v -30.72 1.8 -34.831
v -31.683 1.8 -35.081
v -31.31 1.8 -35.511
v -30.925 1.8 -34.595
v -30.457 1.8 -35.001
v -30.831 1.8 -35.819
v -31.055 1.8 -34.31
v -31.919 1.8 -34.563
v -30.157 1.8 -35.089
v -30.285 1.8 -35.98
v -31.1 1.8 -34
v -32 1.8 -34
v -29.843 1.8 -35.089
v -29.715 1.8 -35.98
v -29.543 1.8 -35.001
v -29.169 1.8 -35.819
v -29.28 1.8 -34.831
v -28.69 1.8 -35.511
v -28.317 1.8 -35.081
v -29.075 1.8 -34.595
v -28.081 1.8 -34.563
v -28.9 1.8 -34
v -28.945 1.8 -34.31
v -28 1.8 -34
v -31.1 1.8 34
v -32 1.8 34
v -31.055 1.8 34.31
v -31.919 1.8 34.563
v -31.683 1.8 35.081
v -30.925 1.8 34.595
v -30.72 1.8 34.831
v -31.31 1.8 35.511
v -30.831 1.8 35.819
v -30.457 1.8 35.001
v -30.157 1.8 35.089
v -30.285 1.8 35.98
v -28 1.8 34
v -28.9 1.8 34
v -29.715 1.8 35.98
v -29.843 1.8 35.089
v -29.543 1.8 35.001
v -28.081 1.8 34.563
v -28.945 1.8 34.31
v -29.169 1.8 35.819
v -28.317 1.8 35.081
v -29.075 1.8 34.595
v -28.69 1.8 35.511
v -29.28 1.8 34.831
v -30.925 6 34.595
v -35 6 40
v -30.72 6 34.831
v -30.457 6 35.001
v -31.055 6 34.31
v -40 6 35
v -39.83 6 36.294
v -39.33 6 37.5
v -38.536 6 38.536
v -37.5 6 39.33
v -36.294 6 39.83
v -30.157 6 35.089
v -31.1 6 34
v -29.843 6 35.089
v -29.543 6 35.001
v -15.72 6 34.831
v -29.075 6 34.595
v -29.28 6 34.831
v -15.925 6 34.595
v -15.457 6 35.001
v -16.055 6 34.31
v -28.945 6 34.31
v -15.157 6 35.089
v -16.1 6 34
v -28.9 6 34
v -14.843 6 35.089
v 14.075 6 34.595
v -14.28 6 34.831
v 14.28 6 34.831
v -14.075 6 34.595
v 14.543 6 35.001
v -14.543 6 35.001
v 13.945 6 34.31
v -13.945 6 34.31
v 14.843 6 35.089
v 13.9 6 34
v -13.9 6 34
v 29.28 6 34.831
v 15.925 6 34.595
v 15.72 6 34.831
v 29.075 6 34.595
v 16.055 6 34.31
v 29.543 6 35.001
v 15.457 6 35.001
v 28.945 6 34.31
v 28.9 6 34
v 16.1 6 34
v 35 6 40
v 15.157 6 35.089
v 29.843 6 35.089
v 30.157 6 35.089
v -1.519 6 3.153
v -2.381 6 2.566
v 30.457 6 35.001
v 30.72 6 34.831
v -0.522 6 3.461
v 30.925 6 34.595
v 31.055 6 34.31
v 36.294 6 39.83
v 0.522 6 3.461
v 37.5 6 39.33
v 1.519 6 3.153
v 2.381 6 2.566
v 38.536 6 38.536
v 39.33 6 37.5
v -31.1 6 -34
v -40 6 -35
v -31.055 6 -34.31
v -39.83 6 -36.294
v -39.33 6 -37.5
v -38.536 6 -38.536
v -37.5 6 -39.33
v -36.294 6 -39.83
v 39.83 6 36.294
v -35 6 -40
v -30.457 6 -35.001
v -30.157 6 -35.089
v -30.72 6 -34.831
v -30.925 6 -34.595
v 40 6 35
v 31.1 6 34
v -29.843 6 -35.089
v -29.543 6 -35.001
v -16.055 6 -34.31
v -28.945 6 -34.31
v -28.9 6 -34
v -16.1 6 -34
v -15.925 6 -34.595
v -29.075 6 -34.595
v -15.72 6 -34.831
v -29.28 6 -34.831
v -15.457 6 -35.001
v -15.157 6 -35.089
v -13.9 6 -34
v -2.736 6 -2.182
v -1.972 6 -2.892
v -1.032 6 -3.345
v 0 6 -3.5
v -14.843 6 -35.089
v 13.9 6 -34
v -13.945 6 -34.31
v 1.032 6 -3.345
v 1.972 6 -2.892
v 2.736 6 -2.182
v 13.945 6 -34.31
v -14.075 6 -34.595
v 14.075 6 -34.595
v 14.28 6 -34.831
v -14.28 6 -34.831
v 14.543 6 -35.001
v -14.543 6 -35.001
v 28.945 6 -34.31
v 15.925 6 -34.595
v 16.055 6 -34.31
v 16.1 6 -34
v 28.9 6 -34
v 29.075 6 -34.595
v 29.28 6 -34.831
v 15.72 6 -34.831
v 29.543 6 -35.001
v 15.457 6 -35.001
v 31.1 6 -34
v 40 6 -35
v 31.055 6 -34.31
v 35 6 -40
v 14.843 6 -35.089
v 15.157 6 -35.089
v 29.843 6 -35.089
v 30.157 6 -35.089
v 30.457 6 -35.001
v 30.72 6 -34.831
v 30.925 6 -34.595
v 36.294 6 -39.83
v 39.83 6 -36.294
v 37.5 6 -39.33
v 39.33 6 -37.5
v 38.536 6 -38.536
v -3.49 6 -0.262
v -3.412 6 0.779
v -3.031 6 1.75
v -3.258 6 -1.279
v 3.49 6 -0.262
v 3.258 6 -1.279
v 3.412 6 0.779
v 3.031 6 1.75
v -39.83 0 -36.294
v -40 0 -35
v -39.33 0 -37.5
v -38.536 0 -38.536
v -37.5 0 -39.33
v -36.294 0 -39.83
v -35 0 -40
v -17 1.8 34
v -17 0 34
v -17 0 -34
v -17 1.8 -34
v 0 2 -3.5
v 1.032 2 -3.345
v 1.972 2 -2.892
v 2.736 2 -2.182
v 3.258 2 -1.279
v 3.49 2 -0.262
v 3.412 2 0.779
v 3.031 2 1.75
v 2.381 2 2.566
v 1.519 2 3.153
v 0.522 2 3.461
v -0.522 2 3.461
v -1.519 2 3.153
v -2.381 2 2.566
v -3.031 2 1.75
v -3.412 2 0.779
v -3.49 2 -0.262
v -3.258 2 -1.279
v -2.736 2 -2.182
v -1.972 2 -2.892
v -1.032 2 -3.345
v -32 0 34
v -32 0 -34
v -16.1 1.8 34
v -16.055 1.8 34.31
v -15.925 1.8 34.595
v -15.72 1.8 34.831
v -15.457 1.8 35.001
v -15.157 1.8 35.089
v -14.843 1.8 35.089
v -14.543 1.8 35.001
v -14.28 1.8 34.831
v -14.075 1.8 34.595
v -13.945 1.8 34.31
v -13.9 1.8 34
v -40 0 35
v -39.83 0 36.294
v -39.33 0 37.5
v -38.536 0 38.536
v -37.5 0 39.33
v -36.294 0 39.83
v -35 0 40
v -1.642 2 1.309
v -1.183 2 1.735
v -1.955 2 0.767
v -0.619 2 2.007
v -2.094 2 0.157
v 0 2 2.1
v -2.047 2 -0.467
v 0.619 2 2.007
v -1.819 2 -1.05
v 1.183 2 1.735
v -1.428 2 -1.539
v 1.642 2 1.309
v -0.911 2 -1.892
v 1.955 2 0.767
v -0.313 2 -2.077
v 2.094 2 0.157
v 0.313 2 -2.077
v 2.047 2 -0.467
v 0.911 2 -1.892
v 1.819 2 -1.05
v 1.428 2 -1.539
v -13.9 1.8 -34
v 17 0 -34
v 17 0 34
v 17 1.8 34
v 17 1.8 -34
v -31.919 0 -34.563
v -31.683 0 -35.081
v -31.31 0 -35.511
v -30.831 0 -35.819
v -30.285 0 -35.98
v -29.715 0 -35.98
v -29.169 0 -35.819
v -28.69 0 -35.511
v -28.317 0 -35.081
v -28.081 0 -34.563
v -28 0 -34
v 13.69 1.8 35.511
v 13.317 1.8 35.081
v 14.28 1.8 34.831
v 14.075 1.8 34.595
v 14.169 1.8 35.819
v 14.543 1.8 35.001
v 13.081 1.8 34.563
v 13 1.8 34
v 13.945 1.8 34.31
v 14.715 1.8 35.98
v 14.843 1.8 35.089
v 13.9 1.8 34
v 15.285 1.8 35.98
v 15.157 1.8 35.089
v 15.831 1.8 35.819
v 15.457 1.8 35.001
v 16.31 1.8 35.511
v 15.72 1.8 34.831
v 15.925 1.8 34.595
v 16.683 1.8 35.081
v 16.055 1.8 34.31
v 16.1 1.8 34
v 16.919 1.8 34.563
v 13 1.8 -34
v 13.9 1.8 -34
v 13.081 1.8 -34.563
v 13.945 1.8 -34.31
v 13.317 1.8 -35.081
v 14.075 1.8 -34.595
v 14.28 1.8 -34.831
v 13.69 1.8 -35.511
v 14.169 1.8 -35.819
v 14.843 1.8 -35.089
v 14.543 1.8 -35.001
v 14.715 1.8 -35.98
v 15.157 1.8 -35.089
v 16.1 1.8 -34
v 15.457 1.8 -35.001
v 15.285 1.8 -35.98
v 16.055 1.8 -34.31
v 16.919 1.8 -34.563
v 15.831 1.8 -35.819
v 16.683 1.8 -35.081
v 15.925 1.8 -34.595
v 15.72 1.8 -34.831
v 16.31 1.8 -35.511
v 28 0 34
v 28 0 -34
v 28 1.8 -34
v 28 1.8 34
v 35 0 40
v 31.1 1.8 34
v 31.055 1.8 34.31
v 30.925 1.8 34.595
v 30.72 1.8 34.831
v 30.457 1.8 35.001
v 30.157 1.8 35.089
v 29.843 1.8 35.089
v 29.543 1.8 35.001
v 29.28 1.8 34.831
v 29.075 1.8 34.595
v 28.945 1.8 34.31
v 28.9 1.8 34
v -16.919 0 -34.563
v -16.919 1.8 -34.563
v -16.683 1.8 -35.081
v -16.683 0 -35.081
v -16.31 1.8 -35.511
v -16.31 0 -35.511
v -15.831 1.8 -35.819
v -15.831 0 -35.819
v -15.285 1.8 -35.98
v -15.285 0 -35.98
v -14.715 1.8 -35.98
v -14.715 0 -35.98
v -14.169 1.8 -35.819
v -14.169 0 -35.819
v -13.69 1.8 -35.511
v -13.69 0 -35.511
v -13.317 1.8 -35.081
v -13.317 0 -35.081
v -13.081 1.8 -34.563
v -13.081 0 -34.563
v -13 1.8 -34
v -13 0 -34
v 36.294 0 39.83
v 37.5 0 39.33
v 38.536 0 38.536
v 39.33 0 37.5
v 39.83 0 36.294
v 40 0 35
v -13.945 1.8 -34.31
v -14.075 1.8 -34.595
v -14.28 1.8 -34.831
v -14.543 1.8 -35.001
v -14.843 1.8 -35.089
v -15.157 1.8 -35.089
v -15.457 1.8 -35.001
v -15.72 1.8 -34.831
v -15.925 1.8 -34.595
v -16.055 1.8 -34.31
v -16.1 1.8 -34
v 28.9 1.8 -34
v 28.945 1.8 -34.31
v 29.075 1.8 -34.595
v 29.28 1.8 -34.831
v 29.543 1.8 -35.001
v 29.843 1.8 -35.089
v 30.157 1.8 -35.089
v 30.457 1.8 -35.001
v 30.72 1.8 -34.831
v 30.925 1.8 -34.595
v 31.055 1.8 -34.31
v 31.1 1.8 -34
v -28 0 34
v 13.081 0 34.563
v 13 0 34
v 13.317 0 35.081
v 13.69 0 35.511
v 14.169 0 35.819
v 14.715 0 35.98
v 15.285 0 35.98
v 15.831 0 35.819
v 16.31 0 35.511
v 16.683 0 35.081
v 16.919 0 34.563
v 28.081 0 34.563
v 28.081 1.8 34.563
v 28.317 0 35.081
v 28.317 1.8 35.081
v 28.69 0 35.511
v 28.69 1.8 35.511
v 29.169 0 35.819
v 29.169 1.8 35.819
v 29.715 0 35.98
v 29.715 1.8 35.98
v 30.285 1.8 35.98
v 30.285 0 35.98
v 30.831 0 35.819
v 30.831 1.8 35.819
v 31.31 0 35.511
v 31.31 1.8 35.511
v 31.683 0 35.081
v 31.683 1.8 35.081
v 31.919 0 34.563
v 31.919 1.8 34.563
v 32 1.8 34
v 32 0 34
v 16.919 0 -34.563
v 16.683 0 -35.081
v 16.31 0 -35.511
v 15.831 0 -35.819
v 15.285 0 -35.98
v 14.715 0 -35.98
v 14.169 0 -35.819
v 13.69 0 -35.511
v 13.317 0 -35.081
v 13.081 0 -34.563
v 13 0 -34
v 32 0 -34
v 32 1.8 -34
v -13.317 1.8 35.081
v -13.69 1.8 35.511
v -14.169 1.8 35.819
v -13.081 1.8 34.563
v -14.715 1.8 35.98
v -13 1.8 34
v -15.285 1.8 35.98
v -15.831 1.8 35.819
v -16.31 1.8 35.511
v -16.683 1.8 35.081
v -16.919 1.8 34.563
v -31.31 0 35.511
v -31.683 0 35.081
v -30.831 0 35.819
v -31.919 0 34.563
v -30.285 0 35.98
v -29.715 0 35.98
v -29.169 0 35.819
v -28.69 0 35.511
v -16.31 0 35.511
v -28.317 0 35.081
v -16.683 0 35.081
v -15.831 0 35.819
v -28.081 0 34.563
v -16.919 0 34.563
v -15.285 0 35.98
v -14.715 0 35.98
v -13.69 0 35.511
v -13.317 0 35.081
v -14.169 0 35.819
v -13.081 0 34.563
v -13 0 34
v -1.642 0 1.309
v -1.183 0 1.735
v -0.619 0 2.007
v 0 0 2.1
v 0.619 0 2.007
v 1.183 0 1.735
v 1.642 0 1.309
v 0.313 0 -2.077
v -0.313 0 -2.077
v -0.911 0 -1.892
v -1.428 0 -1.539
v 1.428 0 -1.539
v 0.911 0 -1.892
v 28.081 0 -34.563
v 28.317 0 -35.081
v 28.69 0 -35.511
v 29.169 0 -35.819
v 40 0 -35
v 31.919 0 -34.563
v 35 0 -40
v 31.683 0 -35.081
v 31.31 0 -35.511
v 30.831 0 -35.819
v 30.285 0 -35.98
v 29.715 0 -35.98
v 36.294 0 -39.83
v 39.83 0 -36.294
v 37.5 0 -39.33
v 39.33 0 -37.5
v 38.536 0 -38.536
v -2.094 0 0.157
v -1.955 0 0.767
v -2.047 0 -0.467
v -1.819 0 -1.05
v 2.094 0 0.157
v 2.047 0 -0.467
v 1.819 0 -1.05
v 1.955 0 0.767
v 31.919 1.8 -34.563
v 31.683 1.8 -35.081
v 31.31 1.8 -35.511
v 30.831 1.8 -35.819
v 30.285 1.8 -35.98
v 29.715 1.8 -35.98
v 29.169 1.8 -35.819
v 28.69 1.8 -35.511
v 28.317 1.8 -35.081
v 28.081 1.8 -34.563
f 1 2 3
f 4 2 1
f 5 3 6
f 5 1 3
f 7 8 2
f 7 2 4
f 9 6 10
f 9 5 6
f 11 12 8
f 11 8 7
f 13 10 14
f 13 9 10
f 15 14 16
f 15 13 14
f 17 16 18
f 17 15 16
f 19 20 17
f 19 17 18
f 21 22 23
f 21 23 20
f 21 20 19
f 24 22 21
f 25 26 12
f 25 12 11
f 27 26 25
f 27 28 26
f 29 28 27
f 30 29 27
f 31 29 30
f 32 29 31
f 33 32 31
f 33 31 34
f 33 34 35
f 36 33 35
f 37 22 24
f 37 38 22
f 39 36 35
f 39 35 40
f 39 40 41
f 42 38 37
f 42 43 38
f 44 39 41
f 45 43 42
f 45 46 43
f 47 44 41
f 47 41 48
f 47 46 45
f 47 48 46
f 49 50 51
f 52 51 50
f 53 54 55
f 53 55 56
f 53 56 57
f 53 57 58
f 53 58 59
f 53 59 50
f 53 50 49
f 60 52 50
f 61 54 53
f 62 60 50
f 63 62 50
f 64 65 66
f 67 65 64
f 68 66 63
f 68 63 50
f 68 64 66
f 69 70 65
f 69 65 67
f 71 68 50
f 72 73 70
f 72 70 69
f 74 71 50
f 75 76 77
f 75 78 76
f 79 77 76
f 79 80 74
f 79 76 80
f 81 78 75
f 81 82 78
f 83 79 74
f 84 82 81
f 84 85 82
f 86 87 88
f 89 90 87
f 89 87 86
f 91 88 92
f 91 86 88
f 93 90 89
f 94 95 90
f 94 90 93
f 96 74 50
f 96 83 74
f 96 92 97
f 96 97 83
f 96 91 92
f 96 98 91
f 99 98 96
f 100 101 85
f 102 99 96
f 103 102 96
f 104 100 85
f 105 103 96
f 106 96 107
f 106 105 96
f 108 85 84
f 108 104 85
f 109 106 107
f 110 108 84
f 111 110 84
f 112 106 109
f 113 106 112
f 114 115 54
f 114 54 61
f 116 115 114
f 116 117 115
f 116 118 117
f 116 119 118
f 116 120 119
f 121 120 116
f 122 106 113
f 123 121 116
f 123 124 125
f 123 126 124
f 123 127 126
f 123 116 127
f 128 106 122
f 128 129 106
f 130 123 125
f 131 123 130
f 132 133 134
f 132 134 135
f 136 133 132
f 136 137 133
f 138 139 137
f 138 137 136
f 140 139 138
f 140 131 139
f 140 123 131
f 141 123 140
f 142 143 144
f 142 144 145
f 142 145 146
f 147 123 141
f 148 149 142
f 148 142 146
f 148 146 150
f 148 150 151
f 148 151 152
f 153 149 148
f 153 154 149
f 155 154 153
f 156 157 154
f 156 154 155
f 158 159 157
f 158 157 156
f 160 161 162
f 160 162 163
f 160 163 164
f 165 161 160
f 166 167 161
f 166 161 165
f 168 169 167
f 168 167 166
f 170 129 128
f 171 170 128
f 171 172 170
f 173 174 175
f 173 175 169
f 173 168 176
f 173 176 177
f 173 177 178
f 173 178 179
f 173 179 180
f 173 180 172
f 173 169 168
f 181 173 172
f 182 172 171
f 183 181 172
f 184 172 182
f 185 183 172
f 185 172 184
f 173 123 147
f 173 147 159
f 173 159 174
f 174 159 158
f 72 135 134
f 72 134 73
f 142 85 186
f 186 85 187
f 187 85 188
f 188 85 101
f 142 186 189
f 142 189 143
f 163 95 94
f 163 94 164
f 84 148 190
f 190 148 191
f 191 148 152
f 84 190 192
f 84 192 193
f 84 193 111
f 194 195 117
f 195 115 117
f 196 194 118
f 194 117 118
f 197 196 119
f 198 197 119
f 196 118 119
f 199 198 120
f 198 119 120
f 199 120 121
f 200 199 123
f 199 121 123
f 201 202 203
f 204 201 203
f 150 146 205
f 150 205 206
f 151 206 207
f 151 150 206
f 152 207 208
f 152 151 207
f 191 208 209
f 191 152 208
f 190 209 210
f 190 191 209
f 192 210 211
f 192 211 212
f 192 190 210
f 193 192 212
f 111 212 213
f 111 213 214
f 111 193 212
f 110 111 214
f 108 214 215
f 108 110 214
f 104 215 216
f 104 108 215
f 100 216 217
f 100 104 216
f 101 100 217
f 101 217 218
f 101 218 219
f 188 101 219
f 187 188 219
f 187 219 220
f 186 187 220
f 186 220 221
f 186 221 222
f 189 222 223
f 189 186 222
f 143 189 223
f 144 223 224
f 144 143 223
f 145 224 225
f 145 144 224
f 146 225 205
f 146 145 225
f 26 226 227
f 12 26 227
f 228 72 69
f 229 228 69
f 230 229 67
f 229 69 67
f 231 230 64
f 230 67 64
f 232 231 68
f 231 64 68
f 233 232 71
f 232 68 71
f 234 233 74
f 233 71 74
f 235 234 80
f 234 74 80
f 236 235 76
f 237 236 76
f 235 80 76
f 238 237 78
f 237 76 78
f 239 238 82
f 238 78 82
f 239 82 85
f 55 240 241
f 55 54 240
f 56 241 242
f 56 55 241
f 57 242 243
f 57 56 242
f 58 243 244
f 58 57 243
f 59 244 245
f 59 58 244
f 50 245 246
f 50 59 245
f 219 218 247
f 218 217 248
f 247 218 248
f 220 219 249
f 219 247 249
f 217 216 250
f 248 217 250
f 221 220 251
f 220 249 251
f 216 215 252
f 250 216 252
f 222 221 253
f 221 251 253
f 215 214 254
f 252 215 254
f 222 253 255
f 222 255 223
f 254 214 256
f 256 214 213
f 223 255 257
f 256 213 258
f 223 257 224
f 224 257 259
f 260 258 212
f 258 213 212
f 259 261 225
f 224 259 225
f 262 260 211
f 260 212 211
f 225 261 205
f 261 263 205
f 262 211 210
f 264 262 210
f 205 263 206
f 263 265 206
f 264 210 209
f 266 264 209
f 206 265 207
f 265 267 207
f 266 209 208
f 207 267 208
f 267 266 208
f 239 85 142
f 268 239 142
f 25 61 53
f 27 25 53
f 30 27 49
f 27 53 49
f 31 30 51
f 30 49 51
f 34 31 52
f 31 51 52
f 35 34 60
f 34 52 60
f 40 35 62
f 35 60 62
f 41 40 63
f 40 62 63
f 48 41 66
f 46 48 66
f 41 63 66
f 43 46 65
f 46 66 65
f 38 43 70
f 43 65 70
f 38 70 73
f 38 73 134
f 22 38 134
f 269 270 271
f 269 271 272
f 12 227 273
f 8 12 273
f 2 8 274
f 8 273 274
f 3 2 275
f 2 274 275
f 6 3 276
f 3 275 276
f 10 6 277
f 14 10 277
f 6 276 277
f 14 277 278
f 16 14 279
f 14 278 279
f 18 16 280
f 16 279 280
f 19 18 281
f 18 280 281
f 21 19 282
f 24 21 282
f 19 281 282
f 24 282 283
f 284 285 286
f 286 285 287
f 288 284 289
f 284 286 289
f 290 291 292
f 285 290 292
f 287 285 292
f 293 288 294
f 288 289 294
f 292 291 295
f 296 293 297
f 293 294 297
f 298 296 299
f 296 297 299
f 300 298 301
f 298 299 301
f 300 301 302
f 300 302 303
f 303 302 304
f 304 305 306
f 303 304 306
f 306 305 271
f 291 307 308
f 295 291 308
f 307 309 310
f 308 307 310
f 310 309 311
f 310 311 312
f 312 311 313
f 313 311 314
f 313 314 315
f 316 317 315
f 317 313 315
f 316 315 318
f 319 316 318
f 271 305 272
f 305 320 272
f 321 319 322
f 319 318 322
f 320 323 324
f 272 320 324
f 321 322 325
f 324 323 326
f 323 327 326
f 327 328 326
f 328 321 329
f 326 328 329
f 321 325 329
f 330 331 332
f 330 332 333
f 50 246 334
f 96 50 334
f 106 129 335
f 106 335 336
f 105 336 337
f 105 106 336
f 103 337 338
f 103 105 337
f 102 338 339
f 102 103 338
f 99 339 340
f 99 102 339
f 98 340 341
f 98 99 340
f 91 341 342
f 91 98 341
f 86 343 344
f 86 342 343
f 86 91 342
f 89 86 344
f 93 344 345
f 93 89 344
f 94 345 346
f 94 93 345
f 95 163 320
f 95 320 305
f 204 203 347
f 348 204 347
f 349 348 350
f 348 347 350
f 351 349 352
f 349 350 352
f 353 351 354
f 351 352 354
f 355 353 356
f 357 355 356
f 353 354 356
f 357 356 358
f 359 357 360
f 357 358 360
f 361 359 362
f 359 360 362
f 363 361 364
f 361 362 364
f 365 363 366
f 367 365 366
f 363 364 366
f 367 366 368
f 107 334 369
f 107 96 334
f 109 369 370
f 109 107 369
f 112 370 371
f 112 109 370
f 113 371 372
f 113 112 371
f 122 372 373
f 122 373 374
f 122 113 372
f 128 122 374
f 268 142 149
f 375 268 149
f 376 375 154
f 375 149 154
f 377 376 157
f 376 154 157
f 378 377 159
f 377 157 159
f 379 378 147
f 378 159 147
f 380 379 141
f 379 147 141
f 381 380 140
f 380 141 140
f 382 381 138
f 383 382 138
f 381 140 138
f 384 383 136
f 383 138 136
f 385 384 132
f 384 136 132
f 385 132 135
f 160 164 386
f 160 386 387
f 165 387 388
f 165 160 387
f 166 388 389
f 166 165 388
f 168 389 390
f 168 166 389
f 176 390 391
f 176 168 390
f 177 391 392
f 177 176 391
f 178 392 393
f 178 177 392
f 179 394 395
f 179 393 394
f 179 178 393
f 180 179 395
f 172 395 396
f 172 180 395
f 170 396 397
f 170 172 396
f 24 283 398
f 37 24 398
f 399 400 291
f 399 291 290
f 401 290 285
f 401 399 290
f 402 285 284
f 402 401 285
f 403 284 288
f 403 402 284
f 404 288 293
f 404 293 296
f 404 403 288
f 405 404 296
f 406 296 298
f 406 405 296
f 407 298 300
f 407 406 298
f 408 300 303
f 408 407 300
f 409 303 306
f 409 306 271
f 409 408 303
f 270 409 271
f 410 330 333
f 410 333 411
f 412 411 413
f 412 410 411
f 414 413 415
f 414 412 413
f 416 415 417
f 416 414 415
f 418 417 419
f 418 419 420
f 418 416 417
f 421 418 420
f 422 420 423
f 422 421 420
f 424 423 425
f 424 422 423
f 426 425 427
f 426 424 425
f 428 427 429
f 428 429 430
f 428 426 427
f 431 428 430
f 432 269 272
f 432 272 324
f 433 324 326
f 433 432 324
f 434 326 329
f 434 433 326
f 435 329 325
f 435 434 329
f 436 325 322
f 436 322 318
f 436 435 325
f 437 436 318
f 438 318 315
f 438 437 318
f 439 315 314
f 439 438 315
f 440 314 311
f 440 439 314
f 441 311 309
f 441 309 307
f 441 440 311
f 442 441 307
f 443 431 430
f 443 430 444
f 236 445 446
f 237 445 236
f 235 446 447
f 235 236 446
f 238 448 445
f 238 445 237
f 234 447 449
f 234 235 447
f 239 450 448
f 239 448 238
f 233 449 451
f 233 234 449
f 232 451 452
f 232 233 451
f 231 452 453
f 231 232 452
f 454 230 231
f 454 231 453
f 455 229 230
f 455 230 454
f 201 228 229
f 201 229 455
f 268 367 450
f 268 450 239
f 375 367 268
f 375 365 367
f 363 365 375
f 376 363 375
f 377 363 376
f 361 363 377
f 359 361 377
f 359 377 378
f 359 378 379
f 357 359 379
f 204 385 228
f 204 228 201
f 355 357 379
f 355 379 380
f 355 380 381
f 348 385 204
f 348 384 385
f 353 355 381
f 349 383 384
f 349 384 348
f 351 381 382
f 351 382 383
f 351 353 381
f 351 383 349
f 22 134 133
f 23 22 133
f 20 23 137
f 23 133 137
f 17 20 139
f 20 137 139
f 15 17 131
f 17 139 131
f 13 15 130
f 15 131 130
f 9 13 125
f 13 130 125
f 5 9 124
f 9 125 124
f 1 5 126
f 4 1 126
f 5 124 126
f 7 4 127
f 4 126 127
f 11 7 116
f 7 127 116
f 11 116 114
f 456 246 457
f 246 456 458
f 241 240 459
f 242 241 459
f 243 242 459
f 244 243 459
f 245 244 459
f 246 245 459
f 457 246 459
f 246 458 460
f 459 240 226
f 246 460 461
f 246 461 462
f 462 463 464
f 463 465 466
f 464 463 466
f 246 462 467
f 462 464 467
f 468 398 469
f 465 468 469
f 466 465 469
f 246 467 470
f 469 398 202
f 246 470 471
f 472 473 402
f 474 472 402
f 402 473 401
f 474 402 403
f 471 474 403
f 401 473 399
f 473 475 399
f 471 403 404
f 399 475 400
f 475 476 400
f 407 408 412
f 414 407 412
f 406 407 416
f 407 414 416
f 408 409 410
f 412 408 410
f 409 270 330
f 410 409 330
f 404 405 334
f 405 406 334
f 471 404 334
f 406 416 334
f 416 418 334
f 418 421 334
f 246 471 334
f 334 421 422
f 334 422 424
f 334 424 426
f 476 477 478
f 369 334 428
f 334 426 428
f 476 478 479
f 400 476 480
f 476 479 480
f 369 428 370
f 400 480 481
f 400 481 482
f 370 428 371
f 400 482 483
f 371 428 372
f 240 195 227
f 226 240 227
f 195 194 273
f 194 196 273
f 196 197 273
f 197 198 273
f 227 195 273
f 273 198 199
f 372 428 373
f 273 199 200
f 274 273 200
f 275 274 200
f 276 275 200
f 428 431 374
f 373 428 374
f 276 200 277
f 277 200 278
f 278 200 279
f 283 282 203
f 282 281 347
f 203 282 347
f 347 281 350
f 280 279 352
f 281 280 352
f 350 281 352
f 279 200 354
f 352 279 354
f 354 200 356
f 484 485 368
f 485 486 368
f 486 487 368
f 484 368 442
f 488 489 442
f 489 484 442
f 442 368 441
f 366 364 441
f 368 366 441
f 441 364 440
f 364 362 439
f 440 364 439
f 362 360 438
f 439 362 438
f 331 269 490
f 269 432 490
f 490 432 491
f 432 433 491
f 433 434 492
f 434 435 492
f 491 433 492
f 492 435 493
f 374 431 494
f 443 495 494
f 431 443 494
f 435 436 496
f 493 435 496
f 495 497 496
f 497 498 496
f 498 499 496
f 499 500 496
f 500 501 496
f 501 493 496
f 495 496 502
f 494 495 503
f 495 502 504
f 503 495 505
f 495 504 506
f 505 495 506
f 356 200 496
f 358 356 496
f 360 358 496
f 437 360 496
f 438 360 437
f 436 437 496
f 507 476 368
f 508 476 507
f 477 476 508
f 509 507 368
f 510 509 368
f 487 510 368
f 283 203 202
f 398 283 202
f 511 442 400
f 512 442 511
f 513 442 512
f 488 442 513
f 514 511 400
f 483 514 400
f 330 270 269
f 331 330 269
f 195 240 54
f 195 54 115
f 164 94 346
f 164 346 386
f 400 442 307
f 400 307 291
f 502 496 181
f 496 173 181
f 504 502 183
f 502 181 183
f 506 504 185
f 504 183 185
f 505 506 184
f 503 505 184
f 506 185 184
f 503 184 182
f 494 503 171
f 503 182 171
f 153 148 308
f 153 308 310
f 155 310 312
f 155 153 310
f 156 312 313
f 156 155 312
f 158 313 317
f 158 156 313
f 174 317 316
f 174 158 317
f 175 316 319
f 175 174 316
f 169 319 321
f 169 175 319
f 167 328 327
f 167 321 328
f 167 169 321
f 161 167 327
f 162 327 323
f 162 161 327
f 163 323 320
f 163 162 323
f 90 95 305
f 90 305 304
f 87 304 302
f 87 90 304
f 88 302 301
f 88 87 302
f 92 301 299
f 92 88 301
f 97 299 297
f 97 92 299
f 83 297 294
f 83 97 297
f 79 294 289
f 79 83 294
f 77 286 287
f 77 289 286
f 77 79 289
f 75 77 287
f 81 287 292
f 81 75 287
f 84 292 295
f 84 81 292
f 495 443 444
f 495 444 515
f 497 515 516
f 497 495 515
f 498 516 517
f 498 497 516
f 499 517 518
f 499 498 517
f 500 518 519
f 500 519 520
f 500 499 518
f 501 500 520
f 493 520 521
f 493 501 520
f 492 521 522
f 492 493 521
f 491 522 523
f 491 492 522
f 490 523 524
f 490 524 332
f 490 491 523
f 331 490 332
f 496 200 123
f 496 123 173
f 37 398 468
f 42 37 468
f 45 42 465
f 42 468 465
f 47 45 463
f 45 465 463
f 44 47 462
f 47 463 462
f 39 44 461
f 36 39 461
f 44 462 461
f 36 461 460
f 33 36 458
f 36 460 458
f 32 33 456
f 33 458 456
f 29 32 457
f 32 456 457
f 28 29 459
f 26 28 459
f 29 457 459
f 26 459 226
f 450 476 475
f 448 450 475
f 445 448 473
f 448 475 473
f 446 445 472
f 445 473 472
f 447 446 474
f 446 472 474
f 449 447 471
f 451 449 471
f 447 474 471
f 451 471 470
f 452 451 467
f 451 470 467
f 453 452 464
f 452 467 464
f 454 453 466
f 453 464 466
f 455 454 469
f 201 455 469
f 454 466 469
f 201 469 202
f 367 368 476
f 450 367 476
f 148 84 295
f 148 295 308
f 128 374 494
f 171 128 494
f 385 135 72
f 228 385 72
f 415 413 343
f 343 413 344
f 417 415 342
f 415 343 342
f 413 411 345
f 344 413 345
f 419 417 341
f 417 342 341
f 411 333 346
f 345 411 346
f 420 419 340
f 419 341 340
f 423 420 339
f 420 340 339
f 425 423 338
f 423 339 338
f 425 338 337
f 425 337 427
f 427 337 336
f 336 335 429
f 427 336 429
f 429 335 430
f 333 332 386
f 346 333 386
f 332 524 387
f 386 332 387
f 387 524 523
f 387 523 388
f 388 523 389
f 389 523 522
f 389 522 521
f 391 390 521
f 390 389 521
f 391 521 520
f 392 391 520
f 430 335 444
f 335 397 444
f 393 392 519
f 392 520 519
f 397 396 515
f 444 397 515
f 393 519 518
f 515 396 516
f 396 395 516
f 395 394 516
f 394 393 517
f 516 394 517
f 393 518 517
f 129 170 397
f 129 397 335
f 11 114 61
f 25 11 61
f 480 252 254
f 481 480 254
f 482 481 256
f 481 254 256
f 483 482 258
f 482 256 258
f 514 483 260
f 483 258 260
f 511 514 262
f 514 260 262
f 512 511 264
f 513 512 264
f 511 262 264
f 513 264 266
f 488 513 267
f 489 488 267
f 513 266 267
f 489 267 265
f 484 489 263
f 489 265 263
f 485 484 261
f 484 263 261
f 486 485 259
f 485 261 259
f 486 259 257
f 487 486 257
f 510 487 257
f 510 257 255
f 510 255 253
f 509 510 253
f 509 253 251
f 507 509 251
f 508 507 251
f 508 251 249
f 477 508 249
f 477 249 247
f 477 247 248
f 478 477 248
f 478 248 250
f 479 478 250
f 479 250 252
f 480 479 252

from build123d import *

# Parameters (mm, degrees)
SKETCH1_W            = 80
SKETCH1_H            = 80
BOSS_EXTRUDE1_DEPTH  = 6
CUT_EXTRUDE1_DEPTH   = 57.885850613
CUT_EXTRUDE2_DEPTH   = 1.8
LPATTERN1_COUNT      = 2
LPATTERN1_PITCH      = 15
MIRROR1_COPY_1_DEPTH = 57.885850613
MIRROR1_COPY_2_DEPTH = 1.8
SKETCH5_R            = 3.5
CUT_EXTRUDE3_DEPTH   = 4
SKETCH6_R            = 2.1
CUT_EXTRUDE4_DEPTH   = 57.709787515
FILLET3_R            = 5


with BuildPart() as part:
    # Sketch1 → Boss-Extrude1 (new body)
    with BuildSketch(Plane(origin=(0, 0, 0), x_dir=(1, 0, 0), z_dir=(0, 1, 0))):
        Rectangle(SKETCH1_W, SKETCH1_H)
    extrude(amount=BOSS_EXTRUDE1_DEPTH)

    # Sketch2 → Cut-Extrude1 (cut, through all)
    with BuildSketch(Plane(origin=(0, 6, 0), x_dir=(1, 0, 0), z_dir=(0, 1, 0))):
        with BuildLine():
            Line((16.1, 34), (16.1, -34))
            ThreePointArc((16.1, -34), (15, -35.1), (13.9, -34))
            Line((13.9, -34), (13.9, 34))
            ThreePointArc((13.9, 34), (15, 35.1), (16.1, 34))
        make_face()
    cut_extrude1 = extrude(amount=-CUT_EXTRUDE1_DEPTH, mode=Mode.SUBTRACT)

    # Sketch4 → Cut-Extrude2 (cut)
    with BuildSketch(Plane(origin=(0, 0, 0), x_dir=(1, 0, 0), z_dir=(0, 1, 0))):
        with BuildLine():
            Line((13, 34), (13, -34))
            ThreePointArc((13, -34), (15, -36), (17, -34))
            Line((17, -34), (17, 34))
            ThreePointArc((17, 34), (15, 36), (13, 34))
        make_face()
    cut_extrude2 = extrude(amount=CUT_EXTRUDE2_DEPTH, mode=Mode.SUBTRACT)

    # LPattern1: Cut-Extrude1, Cut-Extrude2 ×2
    with Locations(*[(i * LPATTERN1_PITCH, 0, 0) for i in range(1, LPATTERN1_COUNT)]):
        add(cut_extrude1, mode=Mode.SUBTRACT)
        add(cut_extrude2, mode=Mode.SUBTRACT)

    # Mirror1: Cut-Extrude1, Cut-Extrude2 across plane
    add(cut_extrude1.mirror(Plane(origin=(0, 0, 0), x_dir=(0, 0, 1), z_dir=(1, 0, 0))), mode=Mode.SUBTRACT)
    add(cut_extrude2.mirror(Plane(origin=(0, 0, 0), x_dir=(0, 0, 1), z_dir=(1, 0, 0))), mode=Mode.SUBTRACT)

    # Mirror1 copy 1 sketch → Mirror1 copy 1 (cut, through all)
    with BuildSketch(Plane(origin=(-15, 6, 0), x_dir=(-1, 0, 0), z_dir=(0, 1, 0))):
        with BuildLine():
            Line((16.1, -34), (16.1, 34))
            ThreePointArc((16.1, 34), (15, 35.1), (13.9, 34))
            Line((13.9, 34), (13.9, -34))
            ThreePointArc((13.9, -34), (15, -35.1), (16.1, -34))
        make_face()
    extrude(amount=-MIRROR1_COPY_1_DEPTH, mode=Mode.SUBTRACT)

    # Mirror1 copy 2 sketch → Mirror1 copy 2 (cut)
    with BuildSketch(Plane(origin=(-15, 0, 0), x_dir=(-1, 0, 0), z_dir=(0, 1, 0))):
        with BuildLine():
            Line((13, -34), (13, 34))
            ThreePointArc((13, 34), (15, 36), (17, 34))
            Line((17, 34), (17, -34))
            ThreePointArc((17, -34), (15, -36), (13, -34))
        make_face()
    extrude(amount=MIRROR1_COPY_2_DEPTH, mode=Mode.SUBTRACT)

    # Sketch5 → Cut-Extrude3 (cut)
    with BuildSketch(Plane.XZ.offset(-6)):
        with Locations(Location((0, 0, 0), (0, 0, 270))):
            Circle(SKETCH5_R)
    extrude(amount=CUT_EXTRUDE3_DEPTH, mode=Mode.SUBTRACT)

    # Sketch6 → Cut-Extrude4 (cut, through all)
    with BuildSketch(Plane(origin=(0, 2, 0), x_dir=(1, 0, 0), z_dir=(0, 1, 0))):
        with Locations(Location((0, 0, 0), (0, 0, 270))):
            Circle(SKETCH6_R)
    extrude(amount=-CUT_EXTRUDE4_DEPTH, mode=Mode.SUBTRACT)

    # Fillet3
    fillet3_edges = [part.edges().sort_by_distance(p)[0] for p in [
        (40, 3, 40),
        (-40, 3, 40),
        (-40, 3, -40),
        (40, 3, -40),
    ]]
    fillet(fillet3_edges, radius=FILLET3_R)


solid = part.part
